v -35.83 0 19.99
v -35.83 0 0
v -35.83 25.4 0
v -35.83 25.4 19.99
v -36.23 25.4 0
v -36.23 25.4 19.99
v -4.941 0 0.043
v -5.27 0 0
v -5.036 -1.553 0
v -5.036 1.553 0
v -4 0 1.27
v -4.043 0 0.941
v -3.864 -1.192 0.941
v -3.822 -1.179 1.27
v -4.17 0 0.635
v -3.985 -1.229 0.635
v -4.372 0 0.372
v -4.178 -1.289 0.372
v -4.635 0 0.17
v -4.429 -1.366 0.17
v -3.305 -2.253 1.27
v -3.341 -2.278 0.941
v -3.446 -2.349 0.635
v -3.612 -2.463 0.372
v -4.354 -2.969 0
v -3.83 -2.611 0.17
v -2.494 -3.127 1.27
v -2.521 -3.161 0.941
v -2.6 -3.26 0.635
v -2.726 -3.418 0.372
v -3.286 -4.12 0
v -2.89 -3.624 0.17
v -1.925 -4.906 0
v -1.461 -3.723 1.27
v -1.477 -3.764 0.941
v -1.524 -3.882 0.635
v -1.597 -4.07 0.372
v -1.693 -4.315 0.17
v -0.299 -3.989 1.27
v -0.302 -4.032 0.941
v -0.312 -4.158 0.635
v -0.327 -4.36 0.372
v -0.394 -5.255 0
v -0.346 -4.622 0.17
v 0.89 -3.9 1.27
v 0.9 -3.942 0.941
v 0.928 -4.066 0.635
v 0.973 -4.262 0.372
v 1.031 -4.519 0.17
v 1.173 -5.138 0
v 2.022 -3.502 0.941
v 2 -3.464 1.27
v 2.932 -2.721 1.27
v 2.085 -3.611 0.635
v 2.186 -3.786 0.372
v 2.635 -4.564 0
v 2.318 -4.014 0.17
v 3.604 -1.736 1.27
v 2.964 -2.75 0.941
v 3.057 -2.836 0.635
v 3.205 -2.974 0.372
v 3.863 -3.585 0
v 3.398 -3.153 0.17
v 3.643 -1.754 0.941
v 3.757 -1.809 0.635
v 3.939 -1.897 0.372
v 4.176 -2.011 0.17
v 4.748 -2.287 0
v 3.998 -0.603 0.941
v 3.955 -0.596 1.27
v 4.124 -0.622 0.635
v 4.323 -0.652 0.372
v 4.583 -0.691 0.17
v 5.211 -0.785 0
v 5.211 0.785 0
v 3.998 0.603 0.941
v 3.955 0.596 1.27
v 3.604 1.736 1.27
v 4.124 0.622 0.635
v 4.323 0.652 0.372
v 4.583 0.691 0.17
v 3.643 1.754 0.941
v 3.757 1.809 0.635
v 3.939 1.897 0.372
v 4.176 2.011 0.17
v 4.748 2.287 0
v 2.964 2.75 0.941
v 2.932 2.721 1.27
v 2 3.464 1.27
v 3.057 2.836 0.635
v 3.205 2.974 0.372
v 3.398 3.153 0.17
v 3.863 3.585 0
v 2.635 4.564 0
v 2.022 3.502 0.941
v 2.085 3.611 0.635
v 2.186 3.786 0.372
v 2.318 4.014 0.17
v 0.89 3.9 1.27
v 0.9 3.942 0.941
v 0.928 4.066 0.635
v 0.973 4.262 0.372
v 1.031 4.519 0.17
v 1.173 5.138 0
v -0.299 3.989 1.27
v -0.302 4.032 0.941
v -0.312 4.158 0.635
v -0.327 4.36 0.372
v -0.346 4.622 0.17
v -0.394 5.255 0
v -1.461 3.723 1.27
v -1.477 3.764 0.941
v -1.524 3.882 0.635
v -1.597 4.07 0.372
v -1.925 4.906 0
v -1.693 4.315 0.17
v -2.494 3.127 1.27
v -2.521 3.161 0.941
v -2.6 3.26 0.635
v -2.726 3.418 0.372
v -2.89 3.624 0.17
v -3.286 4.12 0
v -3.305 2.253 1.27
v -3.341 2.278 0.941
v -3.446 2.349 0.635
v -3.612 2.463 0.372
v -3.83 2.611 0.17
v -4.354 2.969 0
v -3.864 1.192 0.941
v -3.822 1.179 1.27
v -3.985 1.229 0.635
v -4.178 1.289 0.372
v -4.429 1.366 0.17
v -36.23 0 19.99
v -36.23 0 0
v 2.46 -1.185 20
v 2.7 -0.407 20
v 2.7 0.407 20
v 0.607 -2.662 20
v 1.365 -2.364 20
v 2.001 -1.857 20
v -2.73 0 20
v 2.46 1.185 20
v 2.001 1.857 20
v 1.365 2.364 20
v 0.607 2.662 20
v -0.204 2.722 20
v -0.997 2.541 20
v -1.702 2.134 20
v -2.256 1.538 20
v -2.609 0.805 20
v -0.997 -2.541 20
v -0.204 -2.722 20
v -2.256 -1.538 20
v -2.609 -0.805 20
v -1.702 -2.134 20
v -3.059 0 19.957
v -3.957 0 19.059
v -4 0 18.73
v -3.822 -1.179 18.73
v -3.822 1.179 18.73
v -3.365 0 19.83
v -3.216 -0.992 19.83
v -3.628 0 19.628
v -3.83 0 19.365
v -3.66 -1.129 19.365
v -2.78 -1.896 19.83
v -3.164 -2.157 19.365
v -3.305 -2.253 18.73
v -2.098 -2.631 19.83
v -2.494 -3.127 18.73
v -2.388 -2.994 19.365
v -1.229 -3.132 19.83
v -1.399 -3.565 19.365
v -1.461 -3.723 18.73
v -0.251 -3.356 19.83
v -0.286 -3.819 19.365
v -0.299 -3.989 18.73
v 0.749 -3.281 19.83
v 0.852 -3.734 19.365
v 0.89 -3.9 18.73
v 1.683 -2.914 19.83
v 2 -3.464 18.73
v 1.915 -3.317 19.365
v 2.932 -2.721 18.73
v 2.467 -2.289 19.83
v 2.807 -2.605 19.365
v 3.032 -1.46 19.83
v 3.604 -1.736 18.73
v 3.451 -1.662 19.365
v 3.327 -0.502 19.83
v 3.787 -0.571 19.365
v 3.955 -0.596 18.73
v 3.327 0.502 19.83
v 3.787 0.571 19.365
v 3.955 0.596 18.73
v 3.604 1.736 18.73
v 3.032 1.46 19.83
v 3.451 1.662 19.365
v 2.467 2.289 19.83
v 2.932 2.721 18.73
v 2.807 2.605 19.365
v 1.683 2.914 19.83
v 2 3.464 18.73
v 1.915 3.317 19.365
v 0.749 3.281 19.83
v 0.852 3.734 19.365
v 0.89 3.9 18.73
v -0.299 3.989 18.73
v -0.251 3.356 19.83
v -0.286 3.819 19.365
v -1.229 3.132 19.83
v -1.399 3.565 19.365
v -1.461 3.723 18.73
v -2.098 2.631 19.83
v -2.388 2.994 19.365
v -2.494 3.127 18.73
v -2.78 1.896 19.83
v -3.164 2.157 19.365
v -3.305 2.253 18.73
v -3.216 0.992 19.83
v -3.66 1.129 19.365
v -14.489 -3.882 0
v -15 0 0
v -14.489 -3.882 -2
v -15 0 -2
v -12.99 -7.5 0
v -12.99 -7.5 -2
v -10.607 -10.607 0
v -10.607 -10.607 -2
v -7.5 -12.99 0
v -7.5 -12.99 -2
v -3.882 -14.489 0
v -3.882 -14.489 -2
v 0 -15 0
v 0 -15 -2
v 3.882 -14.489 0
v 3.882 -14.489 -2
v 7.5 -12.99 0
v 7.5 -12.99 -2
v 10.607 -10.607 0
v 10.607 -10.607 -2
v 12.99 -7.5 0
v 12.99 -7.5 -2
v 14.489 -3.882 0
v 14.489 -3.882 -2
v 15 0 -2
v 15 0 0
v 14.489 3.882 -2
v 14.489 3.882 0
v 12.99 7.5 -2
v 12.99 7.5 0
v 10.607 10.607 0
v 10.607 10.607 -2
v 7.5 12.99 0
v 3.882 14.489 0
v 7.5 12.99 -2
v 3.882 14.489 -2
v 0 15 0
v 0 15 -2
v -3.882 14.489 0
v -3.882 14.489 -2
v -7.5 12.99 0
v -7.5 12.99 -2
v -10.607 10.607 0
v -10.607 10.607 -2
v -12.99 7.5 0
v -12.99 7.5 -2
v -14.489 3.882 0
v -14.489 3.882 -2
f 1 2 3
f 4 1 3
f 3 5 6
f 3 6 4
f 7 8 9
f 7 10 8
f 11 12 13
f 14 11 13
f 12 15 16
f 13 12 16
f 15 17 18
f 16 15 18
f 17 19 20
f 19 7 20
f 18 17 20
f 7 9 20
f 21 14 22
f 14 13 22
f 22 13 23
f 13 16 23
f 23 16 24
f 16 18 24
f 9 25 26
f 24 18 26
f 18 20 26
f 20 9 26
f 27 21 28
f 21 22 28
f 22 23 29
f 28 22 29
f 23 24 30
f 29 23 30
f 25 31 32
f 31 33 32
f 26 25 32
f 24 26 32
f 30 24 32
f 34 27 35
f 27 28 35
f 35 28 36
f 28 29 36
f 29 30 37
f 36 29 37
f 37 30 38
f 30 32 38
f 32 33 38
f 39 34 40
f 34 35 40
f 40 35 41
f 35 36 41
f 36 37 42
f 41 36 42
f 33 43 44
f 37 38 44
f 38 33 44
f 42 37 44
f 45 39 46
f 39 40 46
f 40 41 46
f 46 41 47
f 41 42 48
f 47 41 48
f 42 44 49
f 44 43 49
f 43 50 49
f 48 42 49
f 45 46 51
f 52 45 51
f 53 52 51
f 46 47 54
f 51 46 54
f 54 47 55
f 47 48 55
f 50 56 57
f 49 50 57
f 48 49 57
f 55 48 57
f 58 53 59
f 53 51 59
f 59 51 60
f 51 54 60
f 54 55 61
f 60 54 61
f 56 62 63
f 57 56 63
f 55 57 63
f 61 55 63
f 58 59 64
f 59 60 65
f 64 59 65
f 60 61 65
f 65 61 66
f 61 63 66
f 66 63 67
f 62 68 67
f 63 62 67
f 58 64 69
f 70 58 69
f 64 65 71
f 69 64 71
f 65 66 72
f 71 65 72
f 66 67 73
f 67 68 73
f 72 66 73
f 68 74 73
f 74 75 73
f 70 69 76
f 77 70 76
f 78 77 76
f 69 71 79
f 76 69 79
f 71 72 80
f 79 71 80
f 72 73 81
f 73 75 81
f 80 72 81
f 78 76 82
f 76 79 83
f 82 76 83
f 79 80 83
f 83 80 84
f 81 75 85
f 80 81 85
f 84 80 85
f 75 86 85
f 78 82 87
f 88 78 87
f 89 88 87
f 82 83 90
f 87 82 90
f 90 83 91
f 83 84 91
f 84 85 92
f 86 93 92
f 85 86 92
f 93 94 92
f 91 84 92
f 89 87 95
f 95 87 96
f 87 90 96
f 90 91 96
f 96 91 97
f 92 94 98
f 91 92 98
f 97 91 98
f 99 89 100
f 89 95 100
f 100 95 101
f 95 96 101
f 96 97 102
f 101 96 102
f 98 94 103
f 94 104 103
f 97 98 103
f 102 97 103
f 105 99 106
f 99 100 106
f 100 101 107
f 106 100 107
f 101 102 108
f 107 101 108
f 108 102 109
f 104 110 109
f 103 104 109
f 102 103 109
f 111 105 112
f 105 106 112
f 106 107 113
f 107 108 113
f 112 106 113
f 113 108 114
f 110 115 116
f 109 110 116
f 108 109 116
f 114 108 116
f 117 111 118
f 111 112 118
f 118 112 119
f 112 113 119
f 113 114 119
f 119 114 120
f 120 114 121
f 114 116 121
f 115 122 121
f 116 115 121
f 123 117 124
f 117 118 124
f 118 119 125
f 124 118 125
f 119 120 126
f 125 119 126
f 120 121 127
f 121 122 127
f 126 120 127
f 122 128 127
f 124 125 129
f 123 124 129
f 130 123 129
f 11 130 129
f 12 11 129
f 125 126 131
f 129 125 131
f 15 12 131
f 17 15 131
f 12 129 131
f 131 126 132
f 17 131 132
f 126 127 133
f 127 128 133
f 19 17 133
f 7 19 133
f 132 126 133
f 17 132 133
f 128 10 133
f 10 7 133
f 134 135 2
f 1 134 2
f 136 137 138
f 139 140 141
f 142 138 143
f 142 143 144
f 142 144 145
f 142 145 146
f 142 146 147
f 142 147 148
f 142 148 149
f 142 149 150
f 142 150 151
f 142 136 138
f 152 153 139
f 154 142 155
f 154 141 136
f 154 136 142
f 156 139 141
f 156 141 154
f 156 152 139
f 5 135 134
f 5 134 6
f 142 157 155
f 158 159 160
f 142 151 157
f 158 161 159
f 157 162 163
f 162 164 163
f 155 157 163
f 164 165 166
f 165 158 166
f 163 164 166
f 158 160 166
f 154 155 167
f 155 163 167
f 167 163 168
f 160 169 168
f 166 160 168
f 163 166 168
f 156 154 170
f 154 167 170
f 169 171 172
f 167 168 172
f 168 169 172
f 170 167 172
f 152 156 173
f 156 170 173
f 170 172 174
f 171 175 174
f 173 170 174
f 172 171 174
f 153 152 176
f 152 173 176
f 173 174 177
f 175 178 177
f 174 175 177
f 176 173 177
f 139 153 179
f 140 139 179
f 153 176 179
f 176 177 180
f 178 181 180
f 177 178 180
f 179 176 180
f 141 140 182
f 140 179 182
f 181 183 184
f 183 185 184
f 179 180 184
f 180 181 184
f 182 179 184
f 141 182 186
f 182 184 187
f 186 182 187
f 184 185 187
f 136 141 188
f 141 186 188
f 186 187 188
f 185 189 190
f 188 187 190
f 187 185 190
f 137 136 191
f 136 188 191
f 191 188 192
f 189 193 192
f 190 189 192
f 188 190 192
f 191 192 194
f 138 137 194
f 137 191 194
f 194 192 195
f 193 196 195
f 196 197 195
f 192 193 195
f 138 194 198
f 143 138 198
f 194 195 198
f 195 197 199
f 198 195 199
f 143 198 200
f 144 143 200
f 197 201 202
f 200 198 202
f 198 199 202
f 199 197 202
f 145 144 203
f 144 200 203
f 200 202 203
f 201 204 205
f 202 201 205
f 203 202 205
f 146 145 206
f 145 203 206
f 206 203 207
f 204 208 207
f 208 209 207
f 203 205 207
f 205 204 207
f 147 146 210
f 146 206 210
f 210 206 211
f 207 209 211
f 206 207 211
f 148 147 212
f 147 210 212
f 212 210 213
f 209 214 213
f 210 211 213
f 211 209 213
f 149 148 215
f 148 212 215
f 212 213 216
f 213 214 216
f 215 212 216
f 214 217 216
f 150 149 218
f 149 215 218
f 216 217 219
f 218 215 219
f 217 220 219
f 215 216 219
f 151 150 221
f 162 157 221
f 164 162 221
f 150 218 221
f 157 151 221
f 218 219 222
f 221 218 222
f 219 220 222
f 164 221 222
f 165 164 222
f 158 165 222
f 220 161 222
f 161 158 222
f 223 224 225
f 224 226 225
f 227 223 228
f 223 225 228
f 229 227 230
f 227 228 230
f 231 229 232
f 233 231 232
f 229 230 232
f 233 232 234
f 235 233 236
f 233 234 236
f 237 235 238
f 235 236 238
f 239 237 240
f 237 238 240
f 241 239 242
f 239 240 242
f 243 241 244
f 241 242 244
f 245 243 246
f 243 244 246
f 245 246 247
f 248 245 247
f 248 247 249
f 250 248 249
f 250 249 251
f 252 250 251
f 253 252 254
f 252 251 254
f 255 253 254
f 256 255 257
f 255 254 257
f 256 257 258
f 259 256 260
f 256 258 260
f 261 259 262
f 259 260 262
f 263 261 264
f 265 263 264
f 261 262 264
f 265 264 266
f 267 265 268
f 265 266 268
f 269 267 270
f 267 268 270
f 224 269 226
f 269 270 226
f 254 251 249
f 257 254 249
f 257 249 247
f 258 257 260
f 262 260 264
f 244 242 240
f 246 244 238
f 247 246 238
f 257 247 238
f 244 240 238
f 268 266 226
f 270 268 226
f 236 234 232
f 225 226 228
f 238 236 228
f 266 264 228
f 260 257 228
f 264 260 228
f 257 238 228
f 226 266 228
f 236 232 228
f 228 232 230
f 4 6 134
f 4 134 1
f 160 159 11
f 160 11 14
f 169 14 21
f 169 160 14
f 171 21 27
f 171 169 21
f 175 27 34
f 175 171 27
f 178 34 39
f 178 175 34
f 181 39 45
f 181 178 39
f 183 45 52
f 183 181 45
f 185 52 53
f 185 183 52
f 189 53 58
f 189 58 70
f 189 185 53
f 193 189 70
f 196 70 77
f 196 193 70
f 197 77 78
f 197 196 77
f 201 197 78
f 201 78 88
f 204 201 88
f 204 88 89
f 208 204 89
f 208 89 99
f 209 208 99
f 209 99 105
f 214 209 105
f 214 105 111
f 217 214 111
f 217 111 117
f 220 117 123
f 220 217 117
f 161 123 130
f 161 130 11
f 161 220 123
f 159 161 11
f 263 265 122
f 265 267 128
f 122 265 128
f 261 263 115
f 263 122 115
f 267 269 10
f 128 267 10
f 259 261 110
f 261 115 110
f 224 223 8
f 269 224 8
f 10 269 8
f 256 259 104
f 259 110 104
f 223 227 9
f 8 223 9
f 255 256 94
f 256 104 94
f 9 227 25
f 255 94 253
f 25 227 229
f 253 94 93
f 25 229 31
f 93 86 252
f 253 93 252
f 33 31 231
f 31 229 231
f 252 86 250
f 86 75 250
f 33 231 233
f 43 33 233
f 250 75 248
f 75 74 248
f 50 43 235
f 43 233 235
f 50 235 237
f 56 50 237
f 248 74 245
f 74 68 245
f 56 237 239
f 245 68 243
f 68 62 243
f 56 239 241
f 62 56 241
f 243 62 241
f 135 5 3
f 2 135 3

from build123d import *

# Parameters (mm, degrees)
F0_W     = 4
F0_H     = 20
F2_R     = 1.27
F3_W     = 0.4
F3_H     = 25.4
F4_DEPTH = 19.9898


with BuildPart() as f1:
    # F0 (on Front) → F1 (revolve)
    with BuildSketch(Plane.XZ):
        Polygon((0, -2), (0, 0), (-4, 0), (-15, 0), (-15, -2), align=None)
        with Locations((-2, 10)):
            Rectangle(F0_W, F0_H)
    revolve(axis=Axis((0, 0, 10), (0, 0, 1)))

    # F2
    f2_edges = [f1.edges().sort_by_distance(p)[0] for p in [
        (4, 0, 20),
        (4, 0, 0),
    ]]
    fillet(f2_edges, radius=F2_R)


with BuildPart() as f4:
    # F3 (on Top) → F4 (new body)
    with BuildSketch(Plane.XY):
        with Locations((-36.029795, 12.7)):
            Rectangle(F3_W, F3_H)
    extrude(amount=F4_DEPTH)


solid = Compound([f1.part, f4.part])
